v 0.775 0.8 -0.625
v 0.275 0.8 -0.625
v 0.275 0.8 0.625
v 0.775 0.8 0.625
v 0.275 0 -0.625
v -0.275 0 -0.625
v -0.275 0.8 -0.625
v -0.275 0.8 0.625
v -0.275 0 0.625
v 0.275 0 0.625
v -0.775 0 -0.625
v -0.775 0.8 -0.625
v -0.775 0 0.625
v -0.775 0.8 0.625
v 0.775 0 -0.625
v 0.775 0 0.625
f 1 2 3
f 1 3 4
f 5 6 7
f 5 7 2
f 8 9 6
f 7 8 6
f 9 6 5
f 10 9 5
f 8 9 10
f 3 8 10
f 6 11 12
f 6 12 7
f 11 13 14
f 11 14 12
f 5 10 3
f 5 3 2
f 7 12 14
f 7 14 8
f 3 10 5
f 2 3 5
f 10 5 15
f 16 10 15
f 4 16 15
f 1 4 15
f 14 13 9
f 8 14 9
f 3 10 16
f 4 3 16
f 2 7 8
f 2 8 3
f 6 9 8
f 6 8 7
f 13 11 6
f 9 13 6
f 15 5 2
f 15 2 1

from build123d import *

# Parameters (mm, degrees)
SKETCH1_W             = 0.55
SKETCH1_H             = 1.25
BOSS_EXTRUDE1_DEPTH   = 0.8
SKETCH2_W             = 0.5
SKETCH2_H             = 1.25
BOSS_EXTRUDE2_DEPTH   = 0.8
BOSS_EXTRUDE2_2_DEPTH = 0.8


with BuildPart() as part:
    # Sketch1 → Boss-Extrude1 (new body)
    with BuildSketch(Plane(origin=(0, 0, 0), x_dir=(1, 0, 0), z_dir=(0, 1, 0))):
        Rectangle(SKETCH1_W, SKETCH1_H)
    extrude(amount=BOSS_EXTRUDE1_DEPTH)


with BuildPart() as body_2:
    # Sketch2 → Boss-Extrude2 (new body)
    with BuildSketch(Plane(origin=(0, 0, 0), x_dir=(1, 0, 0), z_dir=(0, 1, 0))):
        with Locations((-0.525, 0)):
            Rectangle(SKETCH2_W, SKETCH2_H)
    extrude(amount=BOSS_EXTRUDE2_DEPTH)


with BuildPart() as body_3:
    # Sketch2 → Boss-Extrude2 2 (new body)
    with BuildSketch(Plane(origin=(0, 0, 0), x_dir=(1, 0, 0), z_dir=(0, 1, 0))):
        with Locations((0.525, 0)):
            Rectangle(SKETCH2_W, SKETCH2_H)
    extrude(amount=BOSS_EXTRUDE2_2_DEPTH)


solid = Compound([part.part, body_2.part, body_3.part])
